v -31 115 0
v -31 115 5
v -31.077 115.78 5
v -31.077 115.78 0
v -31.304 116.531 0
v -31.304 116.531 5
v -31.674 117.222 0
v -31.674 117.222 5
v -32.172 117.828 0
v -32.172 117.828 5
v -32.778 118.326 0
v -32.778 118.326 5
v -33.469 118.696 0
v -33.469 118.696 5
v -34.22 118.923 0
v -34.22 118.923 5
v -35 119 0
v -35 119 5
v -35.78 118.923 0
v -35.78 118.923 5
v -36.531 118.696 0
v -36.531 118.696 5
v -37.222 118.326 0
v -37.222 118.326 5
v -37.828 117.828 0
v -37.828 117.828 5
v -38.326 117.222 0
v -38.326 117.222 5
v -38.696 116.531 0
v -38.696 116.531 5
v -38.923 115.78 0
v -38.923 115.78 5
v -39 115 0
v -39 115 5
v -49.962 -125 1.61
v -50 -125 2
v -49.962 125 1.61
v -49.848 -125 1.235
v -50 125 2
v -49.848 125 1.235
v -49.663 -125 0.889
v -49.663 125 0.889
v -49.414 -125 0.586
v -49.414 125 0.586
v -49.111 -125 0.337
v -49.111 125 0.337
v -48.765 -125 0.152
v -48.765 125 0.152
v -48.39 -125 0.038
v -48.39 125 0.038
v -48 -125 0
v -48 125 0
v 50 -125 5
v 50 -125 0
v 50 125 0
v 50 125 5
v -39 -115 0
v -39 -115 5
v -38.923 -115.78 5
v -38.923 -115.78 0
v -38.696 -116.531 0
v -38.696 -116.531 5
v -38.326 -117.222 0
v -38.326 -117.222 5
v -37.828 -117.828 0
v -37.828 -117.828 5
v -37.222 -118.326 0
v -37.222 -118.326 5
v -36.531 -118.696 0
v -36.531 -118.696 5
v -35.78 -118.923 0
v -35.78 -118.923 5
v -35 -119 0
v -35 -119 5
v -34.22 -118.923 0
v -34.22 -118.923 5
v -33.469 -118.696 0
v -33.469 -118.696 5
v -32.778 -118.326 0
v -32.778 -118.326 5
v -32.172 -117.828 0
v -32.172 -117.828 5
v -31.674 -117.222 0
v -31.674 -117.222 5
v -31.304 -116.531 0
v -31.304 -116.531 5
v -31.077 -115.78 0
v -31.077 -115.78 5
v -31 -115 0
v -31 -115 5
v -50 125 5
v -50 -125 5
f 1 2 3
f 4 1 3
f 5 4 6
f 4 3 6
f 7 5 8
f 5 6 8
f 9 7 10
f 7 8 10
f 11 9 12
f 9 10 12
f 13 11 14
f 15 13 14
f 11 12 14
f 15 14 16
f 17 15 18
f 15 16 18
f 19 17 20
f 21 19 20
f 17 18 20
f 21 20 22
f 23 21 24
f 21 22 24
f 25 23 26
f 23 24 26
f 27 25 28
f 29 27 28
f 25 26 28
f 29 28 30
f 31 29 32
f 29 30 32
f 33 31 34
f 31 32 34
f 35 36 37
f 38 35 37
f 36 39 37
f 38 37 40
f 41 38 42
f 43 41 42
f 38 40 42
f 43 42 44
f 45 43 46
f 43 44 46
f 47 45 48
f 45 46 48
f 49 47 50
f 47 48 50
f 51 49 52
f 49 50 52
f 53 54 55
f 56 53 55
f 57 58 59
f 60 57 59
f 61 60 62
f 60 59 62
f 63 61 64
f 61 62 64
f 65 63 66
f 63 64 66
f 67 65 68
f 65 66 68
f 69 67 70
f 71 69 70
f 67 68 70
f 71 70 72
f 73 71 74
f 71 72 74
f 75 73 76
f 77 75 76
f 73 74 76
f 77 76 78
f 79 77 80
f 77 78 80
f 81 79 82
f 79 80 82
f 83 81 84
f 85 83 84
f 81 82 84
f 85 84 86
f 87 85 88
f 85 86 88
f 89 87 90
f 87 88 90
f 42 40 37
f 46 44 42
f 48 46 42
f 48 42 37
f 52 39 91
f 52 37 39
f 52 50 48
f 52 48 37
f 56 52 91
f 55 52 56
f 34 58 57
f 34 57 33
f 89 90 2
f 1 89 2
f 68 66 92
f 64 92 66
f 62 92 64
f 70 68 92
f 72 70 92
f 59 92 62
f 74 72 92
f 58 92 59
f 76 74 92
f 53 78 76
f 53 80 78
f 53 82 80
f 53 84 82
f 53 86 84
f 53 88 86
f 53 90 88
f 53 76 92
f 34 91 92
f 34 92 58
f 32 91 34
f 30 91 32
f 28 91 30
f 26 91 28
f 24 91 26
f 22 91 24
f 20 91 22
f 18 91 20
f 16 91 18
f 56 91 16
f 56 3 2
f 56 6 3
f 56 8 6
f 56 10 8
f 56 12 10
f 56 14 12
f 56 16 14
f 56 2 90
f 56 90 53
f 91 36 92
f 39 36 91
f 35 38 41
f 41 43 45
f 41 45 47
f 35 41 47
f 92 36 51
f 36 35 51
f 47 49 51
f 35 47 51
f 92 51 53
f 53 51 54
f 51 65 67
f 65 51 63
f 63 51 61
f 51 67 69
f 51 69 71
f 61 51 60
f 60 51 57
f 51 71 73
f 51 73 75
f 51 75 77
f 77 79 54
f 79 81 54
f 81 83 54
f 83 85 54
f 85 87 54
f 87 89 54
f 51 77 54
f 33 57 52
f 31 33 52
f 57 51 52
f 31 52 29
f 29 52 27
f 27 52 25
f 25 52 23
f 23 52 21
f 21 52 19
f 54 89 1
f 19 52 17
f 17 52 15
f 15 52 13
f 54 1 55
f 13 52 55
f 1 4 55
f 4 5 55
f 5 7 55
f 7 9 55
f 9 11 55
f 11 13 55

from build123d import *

# Parameters (mm, degrees)
F0_W     = 100
F0_H     = 250
F1_DEPTH = 5
F3_R     = 2
F2_W     = 8
F2_H     = 230
F4_DEPTH = 25


with BuildPart() as f1:
    # F0 (on Top) → F1 (new body)
    with BuildSketch(Plane.XY):
        Rectangle(F0_W, F0_H)
    extrude(amount=F1_DEPTH)

    # F3
    f3_edges = [f1.edges().sort_by_distance(p)[0] for p in [
        (-50, 0, 0),
    ]]
    fillet(f3_edges, radius=F3_R)

    # F2 (on face) → F4 (cut)
    with BuildSketch(Plane.XY.offset(5)):
        with Locations((-35, 0)):
            Rectangle(F2_W, F2_H)
        with BuildLine():
            ThreePointArc((-31, 115), (-35, 119), (-39, 115))
            Line((-39, 115), (-31, 115))
        make_face()
        with BuildLine():
            Line((-31, -115), (-39, -115))
            ThreePointArc((-39, -115), (-35, -119), (-31, -115))
        make_face()
    extrude(amount=-F4_DEPTH, mode=Mode.SUBTRACT)


solid = f1.part
